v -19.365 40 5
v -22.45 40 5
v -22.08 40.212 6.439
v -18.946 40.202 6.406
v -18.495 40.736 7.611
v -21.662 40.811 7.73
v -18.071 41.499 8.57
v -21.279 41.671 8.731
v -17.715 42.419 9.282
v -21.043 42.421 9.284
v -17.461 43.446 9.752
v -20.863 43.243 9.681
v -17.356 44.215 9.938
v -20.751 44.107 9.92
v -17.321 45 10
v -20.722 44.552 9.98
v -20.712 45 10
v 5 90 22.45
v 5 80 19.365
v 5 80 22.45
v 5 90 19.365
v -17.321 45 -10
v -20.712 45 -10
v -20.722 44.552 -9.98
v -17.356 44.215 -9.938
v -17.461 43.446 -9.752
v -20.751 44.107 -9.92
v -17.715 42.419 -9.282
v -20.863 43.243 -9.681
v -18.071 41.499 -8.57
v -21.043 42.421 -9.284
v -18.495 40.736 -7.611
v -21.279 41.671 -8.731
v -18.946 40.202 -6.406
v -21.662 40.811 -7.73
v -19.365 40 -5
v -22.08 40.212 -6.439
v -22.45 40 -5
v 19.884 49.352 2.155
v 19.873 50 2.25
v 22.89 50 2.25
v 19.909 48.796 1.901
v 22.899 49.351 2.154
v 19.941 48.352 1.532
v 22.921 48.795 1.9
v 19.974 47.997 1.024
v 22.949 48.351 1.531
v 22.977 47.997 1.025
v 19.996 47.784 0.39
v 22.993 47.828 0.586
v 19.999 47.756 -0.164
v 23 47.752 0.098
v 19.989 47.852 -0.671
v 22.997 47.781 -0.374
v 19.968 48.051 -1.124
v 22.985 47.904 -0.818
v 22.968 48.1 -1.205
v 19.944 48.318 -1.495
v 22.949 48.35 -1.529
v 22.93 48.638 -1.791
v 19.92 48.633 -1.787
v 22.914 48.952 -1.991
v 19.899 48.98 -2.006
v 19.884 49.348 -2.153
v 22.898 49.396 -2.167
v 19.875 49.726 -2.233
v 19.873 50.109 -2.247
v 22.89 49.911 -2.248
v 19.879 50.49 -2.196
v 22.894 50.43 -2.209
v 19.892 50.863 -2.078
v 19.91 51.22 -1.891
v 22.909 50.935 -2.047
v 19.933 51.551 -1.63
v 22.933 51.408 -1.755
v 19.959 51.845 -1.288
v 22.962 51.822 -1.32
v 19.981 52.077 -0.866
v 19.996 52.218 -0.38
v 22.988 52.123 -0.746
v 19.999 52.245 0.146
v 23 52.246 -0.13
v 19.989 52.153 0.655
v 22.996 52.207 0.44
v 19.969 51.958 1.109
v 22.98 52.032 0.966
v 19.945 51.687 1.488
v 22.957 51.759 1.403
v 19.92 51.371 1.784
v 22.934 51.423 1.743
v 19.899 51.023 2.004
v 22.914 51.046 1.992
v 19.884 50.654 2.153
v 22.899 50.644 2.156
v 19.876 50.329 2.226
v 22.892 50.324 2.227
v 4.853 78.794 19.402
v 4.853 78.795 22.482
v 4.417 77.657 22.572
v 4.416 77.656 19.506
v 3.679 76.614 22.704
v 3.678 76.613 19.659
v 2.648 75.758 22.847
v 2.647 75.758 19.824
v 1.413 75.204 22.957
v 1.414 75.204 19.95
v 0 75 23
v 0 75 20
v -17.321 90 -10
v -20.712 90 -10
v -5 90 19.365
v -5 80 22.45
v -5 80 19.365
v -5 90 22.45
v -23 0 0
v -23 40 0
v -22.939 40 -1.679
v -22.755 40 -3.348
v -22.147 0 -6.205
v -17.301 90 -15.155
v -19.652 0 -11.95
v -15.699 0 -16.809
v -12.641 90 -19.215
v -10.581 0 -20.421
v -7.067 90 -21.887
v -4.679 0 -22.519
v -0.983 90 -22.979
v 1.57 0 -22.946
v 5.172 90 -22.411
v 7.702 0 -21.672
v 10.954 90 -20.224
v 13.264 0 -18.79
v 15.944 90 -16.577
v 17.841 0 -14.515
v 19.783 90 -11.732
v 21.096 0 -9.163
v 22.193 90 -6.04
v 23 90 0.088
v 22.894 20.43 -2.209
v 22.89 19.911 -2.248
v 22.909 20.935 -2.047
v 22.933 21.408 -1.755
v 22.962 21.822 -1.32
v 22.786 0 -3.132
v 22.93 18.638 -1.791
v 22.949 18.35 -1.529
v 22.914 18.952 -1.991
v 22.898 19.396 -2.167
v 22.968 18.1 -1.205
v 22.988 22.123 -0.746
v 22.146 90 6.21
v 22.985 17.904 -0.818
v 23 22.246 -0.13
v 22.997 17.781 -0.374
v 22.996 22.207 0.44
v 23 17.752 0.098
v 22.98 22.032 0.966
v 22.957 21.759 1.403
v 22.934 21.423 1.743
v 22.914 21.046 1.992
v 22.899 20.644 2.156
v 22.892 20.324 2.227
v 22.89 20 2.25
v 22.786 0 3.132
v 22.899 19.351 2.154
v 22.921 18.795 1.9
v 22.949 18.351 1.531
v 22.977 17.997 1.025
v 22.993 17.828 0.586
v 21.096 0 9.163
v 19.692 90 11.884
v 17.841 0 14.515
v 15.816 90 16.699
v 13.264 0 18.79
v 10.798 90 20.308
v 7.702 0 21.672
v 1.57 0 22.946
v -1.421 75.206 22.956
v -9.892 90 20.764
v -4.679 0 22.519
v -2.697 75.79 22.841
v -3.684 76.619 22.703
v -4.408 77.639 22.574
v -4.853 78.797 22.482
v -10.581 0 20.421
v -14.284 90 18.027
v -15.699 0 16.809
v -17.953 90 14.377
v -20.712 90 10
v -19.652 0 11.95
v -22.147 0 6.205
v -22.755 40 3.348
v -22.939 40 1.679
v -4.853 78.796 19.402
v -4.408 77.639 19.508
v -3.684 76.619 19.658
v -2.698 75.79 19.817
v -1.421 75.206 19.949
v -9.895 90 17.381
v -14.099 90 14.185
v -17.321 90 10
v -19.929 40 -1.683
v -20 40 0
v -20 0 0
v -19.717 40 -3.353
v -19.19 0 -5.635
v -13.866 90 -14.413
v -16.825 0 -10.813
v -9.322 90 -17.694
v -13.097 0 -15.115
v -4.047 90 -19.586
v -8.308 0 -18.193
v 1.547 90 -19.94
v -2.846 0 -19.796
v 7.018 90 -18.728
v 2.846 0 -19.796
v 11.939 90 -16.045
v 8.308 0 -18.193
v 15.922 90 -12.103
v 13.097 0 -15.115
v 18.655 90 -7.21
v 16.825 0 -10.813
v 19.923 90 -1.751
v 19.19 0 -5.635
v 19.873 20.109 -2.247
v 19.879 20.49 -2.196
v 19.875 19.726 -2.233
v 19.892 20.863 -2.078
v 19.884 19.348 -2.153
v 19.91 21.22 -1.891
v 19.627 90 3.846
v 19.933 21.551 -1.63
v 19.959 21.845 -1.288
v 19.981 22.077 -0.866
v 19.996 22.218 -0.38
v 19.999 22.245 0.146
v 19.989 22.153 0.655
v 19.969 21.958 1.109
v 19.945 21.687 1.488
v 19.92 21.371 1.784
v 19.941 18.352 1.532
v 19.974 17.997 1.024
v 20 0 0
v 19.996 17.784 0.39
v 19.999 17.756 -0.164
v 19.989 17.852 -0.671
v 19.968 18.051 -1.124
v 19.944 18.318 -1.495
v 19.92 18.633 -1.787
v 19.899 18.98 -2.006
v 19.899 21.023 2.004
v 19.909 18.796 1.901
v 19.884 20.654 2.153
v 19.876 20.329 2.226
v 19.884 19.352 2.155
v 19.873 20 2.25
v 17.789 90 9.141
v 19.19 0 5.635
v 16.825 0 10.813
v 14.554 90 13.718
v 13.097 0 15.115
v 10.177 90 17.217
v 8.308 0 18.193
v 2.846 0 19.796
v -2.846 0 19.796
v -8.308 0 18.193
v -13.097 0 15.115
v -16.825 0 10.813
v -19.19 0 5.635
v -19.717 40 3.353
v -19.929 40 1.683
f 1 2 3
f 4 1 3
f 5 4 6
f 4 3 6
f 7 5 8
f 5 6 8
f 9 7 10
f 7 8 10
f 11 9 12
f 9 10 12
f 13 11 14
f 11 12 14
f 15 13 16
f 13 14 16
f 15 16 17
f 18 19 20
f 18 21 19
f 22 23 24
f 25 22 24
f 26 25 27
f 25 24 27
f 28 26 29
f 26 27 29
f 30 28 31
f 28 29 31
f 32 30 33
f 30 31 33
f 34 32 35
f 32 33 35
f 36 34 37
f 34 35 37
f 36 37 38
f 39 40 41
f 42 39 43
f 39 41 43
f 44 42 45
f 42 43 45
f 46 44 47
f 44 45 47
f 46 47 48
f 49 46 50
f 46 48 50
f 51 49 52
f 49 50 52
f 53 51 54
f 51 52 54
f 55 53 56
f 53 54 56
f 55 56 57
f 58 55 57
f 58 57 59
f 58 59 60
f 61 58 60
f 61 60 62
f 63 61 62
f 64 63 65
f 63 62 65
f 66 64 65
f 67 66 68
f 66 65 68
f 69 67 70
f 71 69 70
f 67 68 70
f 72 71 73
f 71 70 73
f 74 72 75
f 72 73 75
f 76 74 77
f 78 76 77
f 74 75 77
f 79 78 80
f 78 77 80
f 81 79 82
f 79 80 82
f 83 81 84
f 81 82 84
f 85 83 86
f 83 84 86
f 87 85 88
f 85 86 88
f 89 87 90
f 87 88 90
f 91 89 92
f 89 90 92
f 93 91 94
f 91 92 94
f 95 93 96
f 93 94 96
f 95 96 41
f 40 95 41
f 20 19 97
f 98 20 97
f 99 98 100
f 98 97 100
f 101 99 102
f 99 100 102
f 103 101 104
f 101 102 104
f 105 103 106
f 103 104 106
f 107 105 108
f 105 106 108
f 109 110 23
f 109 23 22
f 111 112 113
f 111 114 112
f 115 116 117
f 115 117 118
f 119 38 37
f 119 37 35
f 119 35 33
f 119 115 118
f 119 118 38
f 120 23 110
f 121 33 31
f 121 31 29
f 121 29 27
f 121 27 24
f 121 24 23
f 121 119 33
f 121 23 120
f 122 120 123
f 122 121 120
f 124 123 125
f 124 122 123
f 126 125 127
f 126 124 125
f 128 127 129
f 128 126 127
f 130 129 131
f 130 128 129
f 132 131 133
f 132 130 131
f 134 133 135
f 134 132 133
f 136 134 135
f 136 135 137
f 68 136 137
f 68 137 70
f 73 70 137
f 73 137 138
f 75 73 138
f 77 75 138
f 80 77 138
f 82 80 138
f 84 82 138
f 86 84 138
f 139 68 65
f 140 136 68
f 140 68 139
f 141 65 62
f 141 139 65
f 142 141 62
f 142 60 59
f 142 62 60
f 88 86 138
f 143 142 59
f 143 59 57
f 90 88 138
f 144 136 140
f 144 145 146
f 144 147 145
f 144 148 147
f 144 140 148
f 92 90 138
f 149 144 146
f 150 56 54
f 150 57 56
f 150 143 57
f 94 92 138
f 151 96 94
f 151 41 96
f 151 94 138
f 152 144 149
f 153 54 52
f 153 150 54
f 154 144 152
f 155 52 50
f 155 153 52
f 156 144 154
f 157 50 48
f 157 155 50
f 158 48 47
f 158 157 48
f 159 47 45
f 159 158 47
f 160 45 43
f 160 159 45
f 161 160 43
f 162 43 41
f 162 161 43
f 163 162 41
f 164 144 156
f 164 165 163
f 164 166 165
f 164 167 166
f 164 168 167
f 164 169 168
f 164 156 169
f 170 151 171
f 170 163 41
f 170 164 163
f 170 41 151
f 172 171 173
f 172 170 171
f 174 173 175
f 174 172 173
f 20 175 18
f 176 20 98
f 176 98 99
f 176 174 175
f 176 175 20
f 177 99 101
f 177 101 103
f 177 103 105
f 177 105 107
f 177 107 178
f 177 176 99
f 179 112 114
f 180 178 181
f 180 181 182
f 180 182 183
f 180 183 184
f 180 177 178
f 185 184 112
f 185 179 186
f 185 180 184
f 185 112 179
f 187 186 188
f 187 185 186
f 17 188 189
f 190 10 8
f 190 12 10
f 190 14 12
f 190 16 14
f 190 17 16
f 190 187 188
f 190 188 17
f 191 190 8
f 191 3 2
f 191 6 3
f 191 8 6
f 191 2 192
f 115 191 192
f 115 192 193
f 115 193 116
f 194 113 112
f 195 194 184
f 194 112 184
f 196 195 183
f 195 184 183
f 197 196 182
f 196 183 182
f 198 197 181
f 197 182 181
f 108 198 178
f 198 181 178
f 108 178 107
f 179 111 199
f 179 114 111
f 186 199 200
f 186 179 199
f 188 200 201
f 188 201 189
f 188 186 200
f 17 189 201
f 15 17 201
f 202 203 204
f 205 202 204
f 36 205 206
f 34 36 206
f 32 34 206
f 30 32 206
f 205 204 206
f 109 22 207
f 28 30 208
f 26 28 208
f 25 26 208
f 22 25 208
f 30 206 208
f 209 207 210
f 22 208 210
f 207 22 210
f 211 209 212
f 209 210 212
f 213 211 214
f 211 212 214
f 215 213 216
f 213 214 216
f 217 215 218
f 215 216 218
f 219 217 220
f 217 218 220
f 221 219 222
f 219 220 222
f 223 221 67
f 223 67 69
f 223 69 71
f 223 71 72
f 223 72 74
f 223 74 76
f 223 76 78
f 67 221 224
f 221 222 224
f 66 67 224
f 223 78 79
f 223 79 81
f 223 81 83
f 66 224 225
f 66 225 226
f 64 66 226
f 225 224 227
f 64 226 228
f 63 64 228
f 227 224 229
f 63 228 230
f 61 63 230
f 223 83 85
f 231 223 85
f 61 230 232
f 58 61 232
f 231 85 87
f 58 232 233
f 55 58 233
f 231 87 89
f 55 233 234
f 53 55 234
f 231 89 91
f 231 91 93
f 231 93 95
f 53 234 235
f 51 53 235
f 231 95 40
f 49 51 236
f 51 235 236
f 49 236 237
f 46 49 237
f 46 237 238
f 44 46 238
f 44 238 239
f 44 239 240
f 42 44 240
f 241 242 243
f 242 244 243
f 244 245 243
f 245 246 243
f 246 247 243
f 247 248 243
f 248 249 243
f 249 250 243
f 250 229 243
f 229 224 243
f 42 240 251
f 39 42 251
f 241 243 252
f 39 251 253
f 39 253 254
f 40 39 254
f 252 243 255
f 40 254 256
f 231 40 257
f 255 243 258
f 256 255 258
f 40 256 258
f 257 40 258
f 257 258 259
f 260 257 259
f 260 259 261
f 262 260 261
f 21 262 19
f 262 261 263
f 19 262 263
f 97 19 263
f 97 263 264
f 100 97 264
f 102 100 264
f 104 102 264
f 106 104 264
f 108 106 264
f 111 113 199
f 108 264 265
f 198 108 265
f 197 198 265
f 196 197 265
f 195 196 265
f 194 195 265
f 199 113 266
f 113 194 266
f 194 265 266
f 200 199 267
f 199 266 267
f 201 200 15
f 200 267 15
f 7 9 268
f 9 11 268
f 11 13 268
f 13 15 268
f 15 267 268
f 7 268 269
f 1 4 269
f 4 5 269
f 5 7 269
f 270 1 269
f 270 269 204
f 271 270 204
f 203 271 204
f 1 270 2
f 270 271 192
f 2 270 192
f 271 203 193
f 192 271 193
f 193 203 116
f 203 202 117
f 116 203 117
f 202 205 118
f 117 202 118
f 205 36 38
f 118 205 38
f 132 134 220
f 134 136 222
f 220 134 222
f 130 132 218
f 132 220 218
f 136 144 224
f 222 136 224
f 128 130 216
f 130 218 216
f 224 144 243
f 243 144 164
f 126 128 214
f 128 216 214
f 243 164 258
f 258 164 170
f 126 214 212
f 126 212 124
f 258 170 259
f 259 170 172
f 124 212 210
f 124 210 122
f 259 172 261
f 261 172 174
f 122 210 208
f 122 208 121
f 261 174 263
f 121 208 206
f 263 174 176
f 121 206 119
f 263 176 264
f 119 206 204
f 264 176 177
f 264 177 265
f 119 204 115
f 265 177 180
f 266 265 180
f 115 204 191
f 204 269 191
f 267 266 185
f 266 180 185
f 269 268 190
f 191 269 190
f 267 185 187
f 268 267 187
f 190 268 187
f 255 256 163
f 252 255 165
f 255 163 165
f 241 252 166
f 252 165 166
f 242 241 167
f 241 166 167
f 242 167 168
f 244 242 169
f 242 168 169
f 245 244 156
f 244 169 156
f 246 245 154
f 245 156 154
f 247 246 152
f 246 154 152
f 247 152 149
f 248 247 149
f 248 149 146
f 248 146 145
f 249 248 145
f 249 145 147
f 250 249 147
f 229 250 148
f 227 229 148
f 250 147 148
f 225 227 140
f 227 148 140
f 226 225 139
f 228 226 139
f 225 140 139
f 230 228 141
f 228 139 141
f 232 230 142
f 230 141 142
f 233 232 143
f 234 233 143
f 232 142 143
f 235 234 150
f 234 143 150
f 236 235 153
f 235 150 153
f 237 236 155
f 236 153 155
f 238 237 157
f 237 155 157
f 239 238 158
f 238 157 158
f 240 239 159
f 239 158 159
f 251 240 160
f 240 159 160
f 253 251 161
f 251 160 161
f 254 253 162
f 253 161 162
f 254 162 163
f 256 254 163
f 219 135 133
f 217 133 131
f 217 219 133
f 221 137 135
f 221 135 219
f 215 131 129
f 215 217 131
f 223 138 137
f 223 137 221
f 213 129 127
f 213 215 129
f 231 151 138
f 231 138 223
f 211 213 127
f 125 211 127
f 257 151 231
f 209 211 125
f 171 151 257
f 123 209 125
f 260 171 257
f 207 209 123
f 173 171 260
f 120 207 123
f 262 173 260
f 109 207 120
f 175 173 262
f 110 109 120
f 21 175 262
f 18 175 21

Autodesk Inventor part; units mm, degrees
ref_plane "YZ Plane" through (0, 0, 0) normal (1, 0, 0) x (0, 1, 0)
ref_plane "XZ Plane" through (0, 0, 0) normal (0, 1, 0) x (-1, 0, 0)
ref_plane "XY Plane" through (0, 0, 0) normal (0, 0, 1) x (1, 0, 0)
sketch "Sketch1" plane through (0, 0, 0) normal (0, 1, 0) x (-1, 0, 0)
  circle A0 centre (0, 0) radius 23
  circle A1 centre (0, 0) radius 20
  dimension "d0" = 3
  dimension "d1" = 40
extrude "Extrusion1" add sketch "Sketch1" along normal blind 90
sketch "Sketch2" plane through (0, 0, 0) normal (0, 0, 1) x (1, 0, 0)
  line L0 (-23, 100) -> (0, 100)
  line L1 (0, 100) -> (0, 40)
  line L2 (0, 40) -> (-23, 40)
  line L3 (-23, 40) -> (-23, 100)
  line L4 (23, 90) -> (-23, 90) projected
  line L5 (-23, 0) -> (23, 0) projected
  point P0 (0, 0)
  dimension "d4" = 60
  dimension "d34" = 40
extrude "Extrusion2" cut sketch "Sketch2" along normal mid plane 20
fillet "Fillet1" radius 5 2 edges at (-19.0164, 40, 10) (-19.0164, 40, -10)
sketch "Sketch3" plane through (0, 0, 0) normal (1, 0, 0) x (0, 1, 0)
  line L0 (-21, 0) -> (126, 0) projected
  line L1 (105, -5) -> (105, 5) projected
  line L2 (90, 20) -> (90, -20) projected
  line L3 (0, 23) -> (0, -23) projected
  point P0 (0, 0)
  point P1 (50, 0)
  point P2 (20, 0)
  dimension "d9" = 30
  dimension "d31" = 20
hole "Hole1" at (0, 50, 0) at (0, 20, 0) direction (1, 0, 0) diameter 4.5 end through all clearance for "Socket Head Cap Screw" size "M4" standard "Ansi Metric M Profile"
sketch "Sketch4" plane through (0, 90, 0) normal (0, 1, 0) x (0, 0, -1)
  arc A0 (-10, 17.3205) -> (10, 17.3205) centre (0, 0) ccw projected
  arc A1 (-10, 20.7123) -> (10, 20.7123) centre (0, 0) ccw projected
  circle A2 centre (0, 0) radius 20 projected
  line L0 (10, 20.7123) -> (10, 17.3205) projected
  line L1 (-10, 17.3205) -> (-10, 20.7123) projected
  line L2 (-19.3649, -5) -> (-23, -5)
  line L3 (-23, -5) -> (-23, 5)
  line L4 (-23, 5) -> (-19.3649, 5)
  line L5 (-19.3649, 5) -> (-19.3649, -5)
  dimension "d32" = 10
  dimension "d33" = 5
extrude "Extrusion3" cut sketch "Sketch4" against normal blind 15 contours L5 A0 | A0 L2 A1 L4 | A1 L3 L4 | L2 L3 A1
fillet "Fillet2" radius 5 2 edges at (5, 75, 20.9074) (-5, 75, 20.9074)
sketch "Sketch5" plane through (0, 0, 0) normal (0, 0, 1) x (1, 0, 0)
  line L0 (23, 90) -> (3, 90)
  line L1 (3, 90) -> (3, 60)
  line L2 (3, 60) -> (23, 60)
  line L3 (23, 60) -> (23, 90)
  line L4 (23, 0) -> (23, 90) projected
  line L5 (23, 90) -> (-20.7123, 90) projected
  point P0 (0, 0)
  point P1 (22.4499, 110)
  point P2 (22.4499, 110)
  dimension "d25" = 0
  dimension "d26" = 20
  dimension "d27" = 30
extrude "Extrusion4" [suppressed]
fillet "Fillet3" [suppressed]
equation "\"d33\" = 0.5 * d32"
properties part number "Pancake_PVC Pipe 2" material "PVC-Piping"
